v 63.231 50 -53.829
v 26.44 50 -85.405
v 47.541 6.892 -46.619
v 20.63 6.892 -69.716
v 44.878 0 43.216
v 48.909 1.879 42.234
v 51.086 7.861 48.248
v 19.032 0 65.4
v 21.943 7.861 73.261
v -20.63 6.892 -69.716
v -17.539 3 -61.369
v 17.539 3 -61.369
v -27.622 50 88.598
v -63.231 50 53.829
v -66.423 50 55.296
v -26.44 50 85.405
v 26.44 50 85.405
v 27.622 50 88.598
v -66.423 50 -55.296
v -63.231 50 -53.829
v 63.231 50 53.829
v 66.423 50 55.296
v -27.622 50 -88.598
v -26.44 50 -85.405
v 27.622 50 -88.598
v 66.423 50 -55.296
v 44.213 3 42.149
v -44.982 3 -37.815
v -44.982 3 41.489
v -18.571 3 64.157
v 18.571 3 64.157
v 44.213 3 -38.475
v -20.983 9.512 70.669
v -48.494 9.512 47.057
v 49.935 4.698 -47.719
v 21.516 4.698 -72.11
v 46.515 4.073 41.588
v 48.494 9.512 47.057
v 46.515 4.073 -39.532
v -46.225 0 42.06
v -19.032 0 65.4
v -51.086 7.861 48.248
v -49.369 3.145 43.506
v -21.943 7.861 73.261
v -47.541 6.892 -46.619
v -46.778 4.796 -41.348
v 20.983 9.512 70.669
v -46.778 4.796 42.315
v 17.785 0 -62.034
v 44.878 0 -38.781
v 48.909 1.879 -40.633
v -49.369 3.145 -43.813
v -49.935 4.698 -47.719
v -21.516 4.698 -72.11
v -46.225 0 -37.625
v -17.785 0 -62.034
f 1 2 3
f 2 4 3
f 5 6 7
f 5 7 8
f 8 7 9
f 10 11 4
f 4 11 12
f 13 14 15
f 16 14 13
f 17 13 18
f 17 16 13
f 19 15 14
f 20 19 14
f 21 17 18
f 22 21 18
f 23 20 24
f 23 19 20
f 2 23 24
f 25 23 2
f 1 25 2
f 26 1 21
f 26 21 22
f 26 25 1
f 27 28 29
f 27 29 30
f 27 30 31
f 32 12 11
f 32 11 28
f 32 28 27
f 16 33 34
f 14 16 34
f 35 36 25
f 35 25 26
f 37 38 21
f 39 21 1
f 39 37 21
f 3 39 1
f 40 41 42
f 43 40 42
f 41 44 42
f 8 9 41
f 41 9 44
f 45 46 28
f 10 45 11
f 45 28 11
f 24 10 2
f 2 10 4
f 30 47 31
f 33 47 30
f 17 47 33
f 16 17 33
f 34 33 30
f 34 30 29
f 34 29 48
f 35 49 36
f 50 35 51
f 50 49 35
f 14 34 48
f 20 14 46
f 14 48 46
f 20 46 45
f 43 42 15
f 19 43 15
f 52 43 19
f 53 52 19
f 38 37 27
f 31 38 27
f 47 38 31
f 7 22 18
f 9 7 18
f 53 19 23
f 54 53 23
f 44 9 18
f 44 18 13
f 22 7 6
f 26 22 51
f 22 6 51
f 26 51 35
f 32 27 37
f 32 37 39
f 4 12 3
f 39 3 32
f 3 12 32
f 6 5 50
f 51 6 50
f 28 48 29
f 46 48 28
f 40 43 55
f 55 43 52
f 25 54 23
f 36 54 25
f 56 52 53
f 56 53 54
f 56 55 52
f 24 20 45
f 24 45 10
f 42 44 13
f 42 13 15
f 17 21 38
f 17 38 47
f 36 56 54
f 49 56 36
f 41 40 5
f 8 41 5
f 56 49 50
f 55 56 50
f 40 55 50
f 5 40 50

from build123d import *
from OCP.BRepFilletAPI import BRepFilletAPI_MakeChamfer

# Parameters (mm, degrees)
SKETCH1_W           = 96.449496644
SKETCH1_H           = 93.866027984
BOSS_EXTRUDE1_DEPTH = 50
DRAFT1_ANGLE        = 20
CHAMFER1_SIZE       = 5
CHAMFER1_SIZE2      = 8.365785926
CHAMFER2_SIZE       = 2
CHAMFER2_SIZE2      = 3.34631437
SHELL1_T            = -3


with BuildPart() as part:
    # Sketch1 → Boss-Extrude1 (new body)
    with BuildSketch(Plane(origin=(0, 0, 0), x_dir=(1, 0, 0), z_dir=(0, 1, 0))):
        Rectangle(SKETCH1_W, SKETCH1_H)
        Polygon((20.883038336, 70.399520989), (48.224748322, 46.933013992), (-48.224748322, 46.933013992), (-20.883038336, 70.399520989), align=None)
        Polygon((-48.224748322, -46.933013992), (48.224748322, -46.933013992), (20.883038336, -70.399520989), (-20.883038336, -70.399520989), align=None)
    extrude(amount=BOSS_EXTRUDE1_DEPTH)

    # Draft1
    draft1_faces = [part.faces().sort_by_distance(p)[0] for p in [
        (-34.553893329, 25, 58.66626749),
        (-48.224748322, 25, 0),
        (-34.553893329, 25, -58.66626749),
        (0, 25, -70.399520989),
        (34.553893329, 25, -58.66626749),
        (48.224748322, 25, 0),
        (34.553893329, 25, 58.66626749),
        (0, 25, 70.399520989),
    ]]
    draft(draft1_faces, Plane(origin=(0, 0, 0), x_dir=(0, 0, -1), z_dir=(0, -1, 0)), DRAFT1_ANGLE)

    # Chamfer1: one chamfer whose edges measure the first distance from different faces: ONE call of the kernel's chamfer builder (chamfer() names one face for all edges)
    chamfer1_edges_1 = [part.edges().sort_by_distance(p)[0] for p in [
        (0, 0, 70.399520989),
        (-34.553893329, 0, 58.66626749),
        (34.553893329, 0, 58.66626749),
    ]]
    chamfer1_side_1 = [part.faces().sort_by_distance(p)[0] for p in [
        (0, 0, 0),
    ]]
    chamfer1_edges_2 = [part.edges().sort_by_distance(p)[0] for p in [
        (-34.553893329, 0, -58.66626749),
    ]]
    chamfer1_side_2 = [part.faces().sort_by_distance(p)[0] for p in [
        (-41.148260159, 26.443805038, -65.690138569),
    ]]
    chamfer1_edges_3 = [part.edges().sort_by_distance(p)[0] for p in [
        (0, 0, -70.399520989),
    ]]
    chamfer1_side_3 = [part.faces().sort_by_distance(p)[0] for p in [
        (0, 26.157748942, -79.920162999),
    ]]
    chamfer1_edges_4 = [part.edges().sort_by_distance(p)[0] for p in [
        (34.553893329, 0, -58.66626749),
    ]]
    chamfer1_side_4 = [part.faces().sort_by_distance(p)[0] for p in [
        (41.148260159, 26.443805038, -65.690138569),
    ]]
    chamfer1 = BRepFilletAPI_MakeChamfer(part.part.solid().wrapped)
    for e in chamfer1_edges_1:
        chamfer1.Add(CHAMFER1_SIZE, CHAMFER1_SIZE2, e.wrapped, chamfer1_side_1[0].wrapped)  # the first distance lies on this face
    for e in chamfer1_edges_2:
        chamfer1.Add(CHAMFER1_SIZE, CHAMFER1_SIZE2, e.wrapped, chamfer1_side_2[0].wrapped)  # the first distance lies on this face
    for e in chamfer1_edges_3:
        chamfer1.Add(CHAMFER1_SIZE, CHAMFER1_SIZE2, e.wrapped, chamfer1_side_3[0].wrapped)  # the first distance lies on this face
    for e in chamfer1_edges_4:
        chamfer1.Add(CHAMFER1_SIZE, CHAMFER1_SIZE2, e.wrapped, chamfer1_side_4[0].wrapped)  # the first distance lies on this face
    add(Compound.cast(chamfer1.Shape()), mode=Mode.REPLACE)

    # Chamfer2: one chamfer whose edges measure the first distance from different faces: ONE call of the kernel's chamfer builder (chamfer() names one face for all edges)
    chamfer2_edges_1 = [part.edges().sort_by_distance(p)[0] for p in [
        (48.224748322, 0, 2.217733352),
    ]]
    chamfer2_side_1 = [part.faces().sort_by_distance(p)[0] for p in [
        (57.660024046, 25.923206996, -0.008470654),
    ]]
    chamfer2_edges_2 = [part.edges().sort_by_distance(p)[0] for p in [
        (-48.224748322, 0, 2.217733352),
    ]]
    chamfer2_side_2 = [part.faces().sort_by_distance(p)[0] for p in [
        (0, 0, 1.984639343),
    ]]
    chamfer2 = BRepFilletAPI_MakeChamfer(part.part.solid().wrapped)
    for e in chamfer2_edges_1:
        chamfer2.Add(CHAMFER2_SIZE, CHAMFER2_SIZE2, e.wrapped, chamfer2_side_1[0].wrapped)  # the first distance lies on this face
    for e in chamfer2_edges_2:
        chamfer2.Add(CHAMFER2_SIZE, CHAMFER2_SIZE2, e.wrapped, chamfer2_side_2[0].wrapped)  # the first distance lies on this face
    add(Compound.cast(chamfer2.Shape()), mode=Mode.REPLACE)

    # Shell1
    shell1_openings = [part.faces().sort_by_distance(p)[0] for p in [
        (0, 50, 0),
    ]]
    offset(amount=SHELL1_T, openings=shell1_openings, kind=Kind.INTERSECTION)


solid = part.part
